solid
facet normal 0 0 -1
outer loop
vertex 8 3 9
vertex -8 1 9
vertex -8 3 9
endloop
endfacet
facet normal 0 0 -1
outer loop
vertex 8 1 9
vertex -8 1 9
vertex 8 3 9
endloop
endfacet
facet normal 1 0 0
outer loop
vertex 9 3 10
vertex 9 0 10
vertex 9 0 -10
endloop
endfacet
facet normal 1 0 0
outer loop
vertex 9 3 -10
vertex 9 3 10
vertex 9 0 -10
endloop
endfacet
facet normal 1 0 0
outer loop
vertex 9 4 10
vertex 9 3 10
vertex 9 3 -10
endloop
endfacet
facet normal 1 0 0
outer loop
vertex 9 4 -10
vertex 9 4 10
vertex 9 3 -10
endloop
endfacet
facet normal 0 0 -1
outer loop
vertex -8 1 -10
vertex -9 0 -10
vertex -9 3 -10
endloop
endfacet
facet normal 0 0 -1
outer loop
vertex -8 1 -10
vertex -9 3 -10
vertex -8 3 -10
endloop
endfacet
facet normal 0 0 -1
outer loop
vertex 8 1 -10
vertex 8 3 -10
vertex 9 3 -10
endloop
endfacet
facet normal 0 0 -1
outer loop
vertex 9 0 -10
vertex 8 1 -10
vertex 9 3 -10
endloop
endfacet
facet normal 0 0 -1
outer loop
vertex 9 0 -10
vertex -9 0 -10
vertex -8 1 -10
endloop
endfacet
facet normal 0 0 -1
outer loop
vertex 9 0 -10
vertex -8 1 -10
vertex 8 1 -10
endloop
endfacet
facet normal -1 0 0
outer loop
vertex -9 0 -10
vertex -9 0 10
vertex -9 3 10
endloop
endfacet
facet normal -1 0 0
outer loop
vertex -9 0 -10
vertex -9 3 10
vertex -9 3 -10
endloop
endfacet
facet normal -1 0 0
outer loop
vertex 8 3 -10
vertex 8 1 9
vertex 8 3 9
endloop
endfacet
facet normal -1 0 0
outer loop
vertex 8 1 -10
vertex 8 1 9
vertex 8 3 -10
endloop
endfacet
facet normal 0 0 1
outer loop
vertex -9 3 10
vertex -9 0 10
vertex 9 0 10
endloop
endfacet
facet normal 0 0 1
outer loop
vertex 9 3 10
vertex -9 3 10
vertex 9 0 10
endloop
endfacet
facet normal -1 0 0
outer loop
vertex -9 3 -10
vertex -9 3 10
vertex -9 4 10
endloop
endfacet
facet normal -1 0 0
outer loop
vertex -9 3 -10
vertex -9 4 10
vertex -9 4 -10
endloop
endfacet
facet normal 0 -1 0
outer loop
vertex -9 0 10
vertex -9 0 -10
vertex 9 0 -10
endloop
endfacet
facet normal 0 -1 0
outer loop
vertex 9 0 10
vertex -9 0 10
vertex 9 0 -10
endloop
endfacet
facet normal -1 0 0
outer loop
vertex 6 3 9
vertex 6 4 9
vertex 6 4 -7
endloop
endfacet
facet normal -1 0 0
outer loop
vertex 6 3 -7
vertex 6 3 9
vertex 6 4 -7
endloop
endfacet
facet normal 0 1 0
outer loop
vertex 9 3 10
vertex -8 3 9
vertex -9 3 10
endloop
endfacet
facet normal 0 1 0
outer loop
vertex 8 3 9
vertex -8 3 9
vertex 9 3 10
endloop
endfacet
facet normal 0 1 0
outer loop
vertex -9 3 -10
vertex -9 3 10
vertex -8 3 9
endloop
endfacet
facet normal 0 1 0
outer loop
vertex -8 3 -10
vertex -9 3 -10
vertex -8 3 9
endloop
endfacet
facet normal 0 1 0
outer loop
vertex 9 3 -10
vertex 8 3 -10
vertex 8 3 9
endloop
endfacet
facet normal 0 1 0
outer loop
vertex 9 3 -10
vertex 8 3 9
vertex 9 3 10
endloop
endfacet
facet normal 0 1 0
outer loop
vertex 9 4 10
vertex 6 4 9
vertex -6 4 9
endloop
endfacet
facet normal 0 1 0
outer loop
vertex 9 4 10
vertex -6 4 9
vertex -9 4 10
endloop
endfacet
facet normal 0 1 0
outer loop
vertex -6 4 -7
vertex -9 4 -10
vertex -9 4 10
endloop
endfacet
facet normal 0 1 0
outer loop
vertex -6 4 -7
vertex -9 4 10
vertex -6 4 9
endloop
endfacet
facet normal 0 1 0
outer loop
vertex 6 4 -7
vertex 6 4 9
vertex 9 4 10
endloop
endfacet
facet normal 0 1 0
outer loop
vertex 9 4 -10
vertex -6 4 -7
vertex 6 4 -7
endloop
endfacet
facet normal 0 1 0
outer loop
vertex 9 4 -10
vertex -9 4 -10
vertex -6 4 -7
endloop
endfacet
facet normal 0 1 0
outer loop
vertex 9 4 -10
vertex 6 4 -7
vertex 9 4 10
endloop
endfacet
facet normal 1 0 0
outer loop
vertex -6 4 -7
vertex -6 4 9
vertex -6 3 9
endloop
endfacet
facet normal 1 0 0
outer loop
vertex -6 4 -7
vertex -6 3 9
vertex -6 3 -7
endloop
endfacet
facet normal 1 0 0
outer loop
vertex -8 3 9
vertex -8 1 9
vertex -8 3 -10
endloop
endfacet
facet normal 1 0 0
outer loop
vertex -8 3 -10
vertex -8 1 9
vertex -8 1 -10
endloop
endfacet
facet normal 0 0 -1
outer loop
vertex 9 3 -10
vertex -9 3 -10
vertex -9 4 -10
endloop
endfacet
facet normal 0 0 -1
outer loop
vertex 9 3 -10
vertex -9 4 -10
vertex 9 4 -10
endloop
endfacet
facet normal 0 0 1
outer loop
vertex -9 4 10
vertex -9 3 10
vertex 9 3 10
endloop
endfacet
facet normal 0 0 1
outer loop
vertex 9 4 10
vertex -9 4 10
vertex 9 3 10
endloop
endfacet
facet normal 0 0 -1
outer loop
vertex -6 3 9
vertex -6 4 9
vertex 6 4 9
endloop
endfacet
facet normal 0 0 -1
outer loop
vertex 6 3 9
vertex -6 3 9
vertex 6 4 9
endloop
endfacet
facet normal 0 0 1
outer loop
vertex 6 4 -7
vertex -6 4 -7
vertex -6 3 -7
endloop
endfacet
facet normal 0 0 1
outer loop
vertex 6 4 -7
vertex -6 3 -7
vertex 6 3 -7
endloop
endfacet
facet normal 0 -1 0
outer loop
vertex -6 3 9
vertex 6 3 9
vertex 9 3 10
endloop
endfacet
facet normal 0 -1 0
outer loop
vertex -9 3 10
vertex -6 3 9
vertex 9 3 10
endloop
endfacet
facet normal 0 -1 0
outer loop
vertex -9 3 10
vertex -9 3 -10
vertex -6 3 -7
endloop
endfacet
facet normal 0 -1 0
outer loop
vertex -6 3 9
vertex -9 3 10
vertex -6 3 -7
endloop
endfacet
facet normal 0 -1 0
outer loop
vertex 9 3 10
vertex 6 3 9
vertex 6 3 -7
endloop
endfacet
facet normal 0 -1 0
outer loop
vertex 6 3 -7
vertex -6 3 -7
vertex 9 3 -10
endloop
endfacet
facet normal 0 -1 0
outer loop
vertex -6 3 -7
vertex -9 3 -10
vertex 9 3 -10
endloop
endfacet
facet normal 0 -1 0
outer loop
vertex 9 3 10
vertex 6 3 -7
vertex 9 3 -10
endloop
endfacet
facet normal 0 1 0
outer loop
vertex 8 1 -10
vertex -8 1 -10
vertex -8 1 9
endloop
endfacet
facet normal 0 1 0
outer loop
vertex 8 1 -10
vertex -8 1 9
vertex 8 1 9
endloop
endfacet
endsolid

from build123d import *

# Parameters (mm, degrees)
SKETCH_1_W          = 18
SKETCH_1_H          = 20
EXTRUDE_1_DEPTH     = 3
CUT_EXTRUDE_START   = 1
SKETCH_3_W          = 16
SKETCH_3_H          = 19
CUT_EXTRUDE_1_DEPTH = 3
EXTRUDE_START       = 3
SKETCH_4_W          = 18
SKETCH_4_H          = 20
EXTRUDE_2_DEPTH     = 1
CUT_EXTRUDE_START_2 = 4
SKETCH_7_W          = 12
SKETCH_7_H          = 16
CUT_EXTRUDE_3_DEPTH = 1


with BuildPart() as part:
    # 스케치1 → 보스-돌출1 (new body)
    with BuildSketch(Plane(origin=(0, 0, 0), x_dir=(1, 0, 0), z_dir=(0, 1, 0))):
        Rectangle(SKETCH_1_W, SKETCH_1_H)
    extrude(amount=EXTRUDE_1_DEPTH)

    # 스케치3 → 컷-돌출1 (cut)
    with BuildSketch(Plane(origin=(0, 0, 0), x_dir=(1, 0, 0), z_dir=(0, 1, 0)).offset(CUT_EXTRUDE_START)):
        with Locations((0, 0.5)):
            Rectangle(SKETCH_3_W, SKETCH_3_H)
    extrude(amount=CUT_EXTRUDE_1_DEPTH, mode=Mode.SUBTRACT)


with BuildPart() as body_2:
    # 스케치4 → 보스-돌출2 (new body)
    with BuildSketch(Plane(origin=(0, 0, 0), x_dir=(1, 0, 0), z_dir=(0, 1, 0)).offset(EXTRUDE_START)):
        Rectangle(SKETCH_4_W, SKETCH_4_H)
    extrude(amount=EXTRUDE_2_DEPTH)

    # 스케치7 → 컷-돌출3 (cut)
    with BuildSketch(Plane(origin=(0, 0, 0), x_dir=(1, 0, 0), z_dir=(0, 1, 0)).offset(CUT_EXTRUDE_START_2)):
        with Locations((0, -1)):
            Rectangle(SKETCH_7_W, SKETCH_7_H)
    extrude(amount=-CUT_EXTRUDE_3_DEPTH, mode=Mode.SUBTRACT)


solid = Compound([part.part, body_2.part])
